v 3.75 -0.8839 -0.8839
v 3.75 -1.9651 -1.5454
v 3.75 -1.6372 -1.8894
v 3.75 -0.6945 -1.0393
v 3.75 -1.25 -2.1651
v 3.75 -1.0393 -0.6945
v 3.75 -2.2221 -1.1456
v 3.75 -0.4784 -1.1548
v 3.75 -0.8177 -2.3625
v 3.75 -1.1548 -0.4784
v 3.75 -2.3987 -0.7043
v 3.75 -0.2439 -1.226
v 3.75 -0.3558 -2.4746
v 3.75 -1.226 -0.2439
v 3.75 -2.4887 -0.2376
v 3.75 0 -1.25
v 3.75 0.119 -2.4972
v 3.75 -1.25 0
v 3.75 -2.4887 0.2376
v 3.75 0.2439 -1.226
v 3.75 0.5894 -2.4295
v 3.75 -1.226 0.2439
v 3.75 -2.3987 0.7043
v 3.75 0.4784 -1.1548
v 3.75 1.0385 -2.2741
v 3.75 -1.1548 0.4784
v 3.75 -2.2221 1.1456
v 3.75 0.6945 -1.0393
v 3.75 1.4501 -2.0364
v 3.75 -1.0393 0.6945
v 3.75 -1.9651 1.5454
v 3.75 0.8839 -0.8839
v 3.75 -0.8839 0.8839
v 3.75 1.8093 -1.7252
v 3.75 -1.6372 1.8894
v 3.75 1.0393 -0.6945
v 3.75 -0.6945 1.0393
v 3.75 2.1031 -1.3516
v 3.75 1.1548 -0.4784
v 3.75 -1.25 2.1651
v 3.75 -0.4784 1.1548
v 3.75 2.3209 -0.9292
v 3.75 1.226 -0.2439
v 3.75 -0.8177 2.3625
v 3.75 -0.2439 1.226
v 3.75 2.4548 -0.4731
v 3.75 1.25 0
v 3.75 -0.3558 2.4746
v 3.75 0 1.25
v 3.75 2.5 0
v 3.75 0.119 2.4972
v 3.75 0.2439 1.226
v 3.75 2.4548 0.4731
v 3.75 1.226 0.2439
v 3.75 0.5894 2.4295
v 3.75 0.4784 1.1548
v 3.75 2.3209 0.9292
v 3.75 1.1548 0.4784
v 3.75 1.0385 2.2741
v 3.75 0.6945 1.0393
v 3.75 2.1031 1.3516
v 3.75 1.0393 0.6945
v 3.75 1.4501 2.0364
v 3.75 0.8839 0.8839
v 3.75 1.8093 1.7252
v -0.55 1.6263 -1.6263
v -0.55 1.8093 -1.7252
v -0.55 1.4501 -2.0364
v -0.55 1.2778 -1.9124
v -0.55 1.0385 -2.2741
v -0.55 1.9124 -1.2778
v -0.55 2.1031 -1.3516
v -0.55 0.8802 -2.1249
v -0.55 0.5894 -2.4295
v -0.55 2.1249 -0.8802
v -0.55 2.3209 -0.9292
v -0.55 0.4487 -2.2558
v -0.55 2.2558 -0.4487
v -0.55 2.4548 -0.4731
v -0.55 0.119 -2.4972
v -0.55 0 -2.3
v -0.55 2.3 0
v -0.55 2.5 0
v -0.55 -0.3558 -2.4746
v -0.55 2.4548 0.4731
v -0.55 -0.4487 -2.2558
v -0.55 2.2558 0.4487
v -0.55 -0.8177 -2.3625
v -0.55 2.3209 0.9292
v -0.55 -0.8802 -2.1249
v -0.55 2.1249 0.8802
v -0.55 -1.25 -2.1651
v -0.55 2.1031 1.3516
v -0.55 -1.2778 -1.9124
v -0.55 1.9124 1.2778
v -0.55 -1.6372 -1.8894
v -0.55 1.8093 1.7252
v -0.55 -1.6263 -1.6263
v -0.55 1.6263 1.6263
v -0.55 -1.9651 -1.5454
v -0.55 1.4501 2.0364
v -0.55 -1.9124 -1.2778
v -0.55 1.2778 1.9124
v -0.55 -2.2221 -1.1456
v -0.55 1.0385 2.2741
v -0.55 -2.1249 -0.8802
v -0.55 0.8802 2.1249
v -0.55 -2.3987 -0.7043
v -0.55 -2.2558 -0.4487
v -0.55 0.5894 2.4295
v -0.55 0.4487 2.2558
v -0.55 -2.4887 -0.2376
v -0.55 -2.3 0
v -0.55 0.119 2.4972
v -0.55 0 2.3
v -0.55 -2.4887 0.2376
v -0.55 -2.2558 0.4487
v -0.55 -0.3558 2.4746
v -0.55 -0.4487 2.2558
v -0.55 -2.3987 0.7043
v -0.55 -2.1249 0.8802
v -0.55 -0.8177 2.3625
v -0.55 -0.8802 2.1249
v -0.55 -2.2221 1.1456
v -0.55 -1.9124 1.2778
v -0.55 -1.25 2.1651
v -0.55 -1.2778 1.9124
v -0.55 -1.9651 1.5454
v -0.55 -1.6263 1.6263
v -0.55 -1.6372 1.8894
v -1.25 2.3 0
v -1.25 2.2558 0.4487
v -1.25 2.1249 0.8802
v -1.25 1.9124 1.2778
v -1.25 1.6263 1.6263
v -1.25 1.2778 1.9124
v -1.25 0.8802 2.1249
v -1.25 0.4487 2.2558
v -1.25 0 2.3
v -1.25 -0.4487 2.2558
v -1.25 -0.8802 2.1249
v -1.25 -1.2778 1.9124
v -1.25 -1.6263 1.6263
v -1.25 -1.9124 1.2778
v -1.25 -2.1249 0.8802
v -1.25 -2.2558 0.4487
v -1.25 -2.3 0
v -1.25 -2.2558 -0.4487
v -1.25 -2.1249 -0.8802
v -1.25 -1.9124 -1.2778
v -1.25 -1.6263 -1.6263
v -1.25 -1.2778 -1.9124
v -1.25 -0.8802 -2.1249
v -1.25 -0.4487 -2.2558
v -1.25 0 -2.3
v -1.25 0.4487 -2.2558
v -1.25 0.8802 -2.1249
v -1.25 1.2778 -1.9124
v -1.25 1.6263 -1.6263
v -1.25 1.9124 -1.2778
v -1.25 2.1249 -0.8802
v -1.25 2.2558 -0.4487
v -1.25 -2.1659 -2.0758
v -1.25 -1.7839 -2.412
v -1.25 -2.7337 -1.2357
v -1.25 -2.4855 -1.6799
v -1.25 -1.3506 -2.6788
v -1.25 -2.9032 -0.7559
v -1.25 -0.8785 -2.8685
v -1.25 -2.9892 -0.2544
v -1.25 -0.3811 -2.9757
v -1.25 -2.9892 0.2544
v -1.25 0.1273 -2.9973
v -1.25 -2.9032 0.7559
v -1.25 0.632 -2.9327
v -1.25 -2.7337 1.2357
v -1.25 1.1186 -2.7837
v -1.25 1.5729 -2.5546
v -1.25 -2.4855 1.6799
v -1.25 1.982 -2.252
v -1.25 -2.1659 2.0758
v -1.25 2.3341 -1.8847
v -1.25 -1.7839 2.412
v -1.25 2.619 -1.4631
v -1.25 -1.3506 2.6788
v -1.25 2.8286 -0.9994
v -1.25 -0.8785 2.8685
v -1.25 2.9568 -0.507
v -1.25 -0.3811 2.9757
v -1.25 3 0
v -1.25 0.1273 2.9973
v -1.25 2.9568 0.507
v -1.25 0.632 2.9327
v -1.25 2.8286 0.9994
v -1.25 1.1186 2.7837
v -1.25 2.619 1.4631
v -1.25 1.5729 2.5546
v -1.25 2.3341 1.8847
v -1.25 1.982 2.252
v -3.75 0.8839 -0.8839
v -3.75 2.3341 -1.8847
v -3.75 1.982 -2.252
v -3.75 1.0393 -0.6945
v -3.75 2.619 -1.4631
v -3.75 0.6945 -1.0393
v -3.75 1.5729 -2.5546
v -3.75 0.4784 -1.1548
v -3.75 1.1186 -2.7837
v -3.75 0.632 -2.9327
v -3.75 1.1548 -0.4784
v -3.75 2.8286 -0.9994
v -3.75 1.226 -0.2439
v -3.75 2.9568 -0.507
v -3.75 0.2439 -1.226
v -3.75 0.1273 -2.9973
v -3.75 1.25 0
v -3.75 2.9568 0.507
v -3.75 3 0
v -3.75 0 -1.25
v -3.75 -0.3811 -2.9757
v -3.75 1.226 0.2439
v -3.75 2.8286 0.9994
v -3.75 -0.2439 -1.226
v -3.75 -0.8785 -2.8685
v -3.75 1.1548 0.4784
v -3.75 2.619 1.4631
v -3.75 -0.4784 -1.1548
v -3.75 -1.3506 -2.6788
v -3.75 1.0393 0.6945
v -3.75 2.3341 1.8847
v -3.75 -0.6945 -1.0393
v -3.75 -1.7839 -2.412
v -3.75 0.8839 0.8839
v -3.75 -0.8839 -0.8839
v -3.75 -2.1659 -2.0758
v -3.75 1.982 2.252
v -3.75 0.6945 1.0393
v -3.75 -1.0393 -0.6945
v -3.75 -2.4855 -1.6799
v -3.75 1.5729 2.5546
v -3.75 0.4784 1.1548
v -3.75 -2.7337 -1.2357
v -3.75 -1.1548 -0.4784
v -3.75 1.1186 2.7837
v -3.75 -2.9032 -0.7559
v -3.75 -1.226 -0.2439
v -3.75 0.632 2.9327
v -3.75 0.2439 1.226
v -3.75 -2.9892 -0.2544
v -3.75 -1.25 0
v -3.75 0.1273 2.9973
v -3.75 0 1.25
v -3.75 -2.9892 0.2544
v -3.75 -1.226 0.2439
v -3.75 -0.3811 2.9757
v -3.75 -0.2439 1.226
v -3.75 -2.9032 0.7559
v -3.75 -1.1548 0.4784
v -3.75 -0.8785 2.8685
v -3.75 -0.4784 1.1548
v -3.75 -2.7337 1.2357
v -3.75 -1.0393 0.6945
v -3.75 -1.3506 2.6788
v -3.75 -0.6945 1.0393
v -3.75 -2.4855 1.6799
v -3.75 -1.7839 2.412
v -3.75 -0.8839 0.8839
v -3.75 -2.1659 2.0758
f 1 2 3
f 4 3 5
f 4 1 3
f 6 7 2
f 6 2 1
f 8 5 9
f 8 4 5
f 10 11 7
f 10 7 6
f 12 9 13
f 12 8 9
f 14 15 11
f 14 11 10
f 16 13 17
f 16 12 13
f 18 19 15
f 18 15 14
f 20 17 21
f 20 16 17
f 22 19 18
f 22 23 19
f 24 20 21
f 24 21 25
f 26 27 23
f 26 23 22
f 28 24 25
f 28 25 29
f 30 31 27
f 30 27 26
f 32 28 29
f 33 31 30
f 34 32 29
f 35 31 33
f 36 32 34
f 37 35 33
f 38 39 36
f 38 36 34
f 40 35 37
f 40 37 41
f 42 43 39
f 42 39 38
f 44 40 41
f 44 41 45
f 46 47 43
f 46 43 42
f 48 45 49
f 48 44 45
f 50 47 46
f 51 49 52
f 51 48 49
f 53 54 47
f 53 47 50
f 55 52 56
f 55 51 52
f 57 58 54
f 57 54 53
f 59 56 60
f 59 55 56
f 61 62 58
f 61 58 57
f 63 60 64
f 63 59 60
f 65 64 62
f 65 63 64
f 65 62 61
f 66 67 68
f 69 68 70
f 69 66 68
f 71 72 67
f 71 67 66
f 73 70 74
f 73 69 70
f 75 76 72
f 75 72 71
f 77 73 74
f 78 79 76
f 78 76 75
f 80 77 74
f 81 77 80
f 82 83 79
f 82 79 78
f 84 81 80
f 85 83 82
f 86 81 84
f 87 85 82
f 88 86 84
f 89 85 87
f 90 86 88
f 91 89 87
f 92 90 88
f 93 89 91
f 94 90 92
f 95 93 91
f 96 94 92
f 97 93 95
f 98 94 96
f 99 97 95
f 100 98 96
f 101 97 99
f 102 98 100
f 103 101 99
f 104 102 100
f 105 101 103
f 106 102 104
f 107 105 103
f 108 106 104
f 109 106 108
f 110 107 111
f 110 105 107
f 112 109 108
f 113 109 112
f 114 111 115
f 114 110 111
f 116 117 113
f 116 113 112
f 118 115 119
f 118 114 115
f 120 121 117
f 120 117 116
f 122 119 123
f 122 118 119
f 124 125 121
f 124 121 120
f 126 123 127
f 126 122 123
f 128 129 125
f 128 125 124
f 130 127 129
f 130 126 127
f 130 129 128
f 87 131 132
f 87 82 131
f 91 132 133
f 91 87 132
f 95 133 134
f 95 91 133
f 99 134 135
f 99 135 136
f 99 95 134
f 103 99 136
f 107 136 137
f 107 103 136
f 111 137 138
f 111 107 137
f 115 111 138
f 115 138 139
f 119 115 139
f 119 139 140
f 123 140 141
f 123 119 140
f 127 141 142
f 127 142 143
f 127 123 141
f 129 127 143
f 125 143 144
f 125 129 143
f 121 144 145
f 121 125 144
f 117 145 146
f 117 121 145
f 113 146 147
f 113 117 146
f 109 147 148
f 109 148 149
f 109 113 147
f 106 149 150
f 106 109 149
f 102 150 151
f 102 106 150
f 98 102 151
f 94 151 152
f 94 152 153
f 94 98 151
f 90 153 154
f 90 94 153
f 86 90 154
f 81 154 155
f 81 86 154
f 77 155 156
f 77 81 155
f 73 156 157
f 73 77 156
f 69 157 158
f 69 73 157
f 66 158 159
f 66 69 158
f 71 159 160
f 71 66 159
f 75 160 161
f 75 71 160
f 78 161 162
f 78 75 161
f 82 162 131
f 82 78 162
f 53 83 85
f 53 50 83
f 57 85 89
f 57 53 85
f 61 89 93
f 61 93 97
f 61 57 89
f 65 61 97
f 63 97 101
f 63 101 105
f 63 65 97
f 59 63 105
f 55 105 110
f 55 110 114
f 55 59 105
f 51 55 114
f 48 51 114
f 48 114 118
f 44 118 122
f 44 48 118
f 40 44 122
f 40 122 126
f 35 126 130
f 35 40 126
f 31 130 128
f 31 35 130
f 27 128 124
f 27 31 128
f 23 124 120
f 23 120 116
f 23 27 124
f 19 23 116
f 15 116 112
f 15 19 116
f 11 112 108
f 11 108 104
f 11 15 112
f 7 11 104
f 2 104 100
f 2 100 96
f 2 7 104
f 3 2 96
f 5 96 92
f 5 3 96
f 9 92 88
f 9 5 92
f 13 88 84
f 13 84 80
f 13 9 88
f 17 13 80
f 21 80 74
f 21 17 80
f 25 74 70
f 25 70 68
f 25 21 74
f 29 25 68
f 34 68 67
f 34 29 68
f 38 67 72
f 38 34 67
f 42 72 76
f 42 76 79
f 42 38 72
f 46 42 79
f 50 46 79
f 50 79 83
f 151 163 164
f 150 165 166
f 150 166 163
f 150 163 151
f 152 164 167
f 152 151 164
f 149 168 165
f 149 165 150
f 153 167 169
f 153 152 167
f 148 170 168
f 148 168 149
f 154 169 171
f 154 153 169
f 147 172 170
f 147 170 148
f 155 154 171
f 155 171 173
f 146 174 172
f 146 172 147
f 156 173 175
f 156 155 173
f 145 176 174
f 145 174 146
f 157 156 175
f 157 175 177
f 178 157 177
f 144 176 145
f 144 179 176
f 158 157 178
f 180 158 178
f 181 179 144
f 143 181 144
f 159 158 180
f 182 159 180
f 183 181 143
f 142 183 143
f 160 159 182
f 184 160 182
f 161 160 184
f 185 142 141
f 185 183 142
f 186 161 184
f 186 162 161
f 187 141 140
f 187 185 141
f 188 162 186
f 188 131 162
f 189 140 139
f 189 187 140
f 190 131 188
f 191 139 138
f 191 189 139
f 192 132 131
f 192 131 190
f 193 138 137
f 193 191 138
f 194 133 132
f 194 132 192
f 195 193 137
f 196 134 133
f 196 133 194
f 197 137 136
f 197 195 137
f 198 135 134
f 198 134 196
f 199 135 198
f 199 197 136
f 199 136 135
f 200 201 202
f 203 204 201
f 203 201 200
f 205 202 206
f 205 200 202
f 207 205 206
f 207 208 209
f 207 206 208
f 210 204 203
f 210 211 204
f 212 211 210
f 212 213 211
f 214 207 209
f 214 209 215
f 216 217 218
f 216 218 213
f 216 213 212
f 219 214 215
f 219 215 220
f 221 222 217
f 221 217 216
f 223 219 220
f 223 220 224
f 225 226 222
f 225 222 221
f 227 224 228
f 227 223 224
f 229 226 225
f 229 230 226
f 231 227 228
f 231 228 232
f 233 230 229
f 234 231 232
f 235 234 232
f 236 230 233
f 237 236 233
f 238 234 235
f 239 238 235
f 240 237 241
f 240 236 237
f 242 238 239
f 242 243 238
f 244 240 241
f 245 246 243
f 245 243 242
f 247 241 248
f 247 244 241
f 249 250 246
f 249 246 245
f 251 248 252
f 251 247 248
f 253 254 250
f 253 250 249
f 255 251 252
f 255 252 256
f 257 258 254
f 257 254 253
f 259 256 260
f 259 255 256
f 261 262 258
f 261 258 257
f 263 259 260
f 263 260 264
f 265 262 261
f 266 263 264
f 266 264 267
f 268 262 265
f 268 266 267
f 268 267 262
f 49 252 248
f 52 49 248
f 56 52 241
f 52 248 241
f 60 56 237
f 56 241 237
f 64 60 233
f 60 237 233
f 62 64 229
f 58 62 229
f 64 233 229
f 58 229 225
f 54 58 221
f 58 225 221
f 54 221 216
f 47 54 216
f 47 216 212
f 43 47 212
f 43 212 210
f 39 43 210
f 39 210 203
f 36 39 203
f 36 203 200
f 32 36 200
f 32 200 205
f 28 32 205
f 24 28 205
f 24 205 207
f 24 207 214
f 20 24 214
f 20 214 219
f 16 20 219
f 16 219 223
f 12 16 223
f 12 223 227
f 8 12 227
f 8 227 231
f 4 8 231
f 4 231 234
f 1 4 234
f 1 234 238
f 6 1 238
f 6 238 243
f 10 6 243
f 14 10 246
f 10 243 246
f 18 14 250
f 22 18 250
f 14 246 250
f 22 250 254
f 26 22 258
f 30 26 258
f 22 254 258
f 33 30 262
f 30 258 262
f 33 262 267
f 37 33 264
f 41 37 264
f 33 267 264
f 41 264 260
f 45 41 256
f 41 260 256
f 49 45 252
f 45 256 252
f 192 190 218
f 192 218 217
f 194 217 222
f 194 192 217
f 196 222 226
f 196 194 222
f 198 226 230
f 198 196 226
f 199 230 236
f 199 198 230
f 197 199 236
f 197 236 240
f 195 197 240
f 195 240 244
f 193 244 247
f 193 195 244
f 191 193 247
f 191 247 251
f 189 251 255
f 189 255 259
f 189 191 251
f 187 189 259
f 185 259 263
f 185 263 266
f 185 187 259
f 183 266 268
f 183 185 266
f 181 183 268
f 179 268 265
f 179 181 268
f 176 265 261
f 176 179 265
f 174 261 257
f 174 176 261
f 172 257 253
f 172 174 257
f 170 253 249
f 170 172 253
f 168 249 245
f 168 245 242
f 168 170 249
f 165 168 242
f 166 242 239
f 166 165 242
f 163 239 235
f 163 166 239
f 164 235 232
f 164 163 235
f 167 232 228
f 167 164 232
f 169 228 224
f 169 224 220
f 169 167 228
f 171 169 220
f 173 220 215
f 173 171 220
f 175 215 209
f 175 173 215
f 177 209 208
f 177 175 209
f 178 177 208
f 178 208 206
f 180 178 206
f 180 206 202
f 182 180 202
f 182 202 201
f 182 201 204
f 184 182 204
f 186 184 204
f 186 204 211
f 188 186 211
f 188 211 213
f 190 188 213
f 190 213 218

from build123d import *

# Parameters (mm, degrees)
TROU_TARAUD_M31_D = 2.5
SKETCH4_W         = 0.7
SKETCH4_H         = 0.7


with BuildPart() as part:
    # Sketch1 → Revolve1 (revolve)
    with BuildSketch(Plane.XY):
        Polygon((-3.75, 0), (-3.75, 3), (-1.25, 3), (-1.25, 2.5), (3.75, 2.5), (3.75, 0), align=None)
    revolve(axis=Axis((0, 0, 0), (1, 0, 0)))

    # Trou taraudé M31 (through all)
    with Locations(Plane(origin=(3.75, 0, 0), x_dir=(0, 0, -1), z_dir=(1, 0, 0))):
        with Locations((0, 0)):
            Hole(TROU_TARAUD_M31_D / 2)

    # Sketch4 → Cut-Revolve1 (revolve, cut)
    with BuildSketch(Plane.XY):
        with Locations((-0.9, 2.65)):
            Rectangle(SKETCH4_W, SKETCH4_H)
    revolve(axis=Axis((-0.090346983, 0, 0), (1, 0, 0)), mode=Mode.SUBTRACT)


solid = part.part
